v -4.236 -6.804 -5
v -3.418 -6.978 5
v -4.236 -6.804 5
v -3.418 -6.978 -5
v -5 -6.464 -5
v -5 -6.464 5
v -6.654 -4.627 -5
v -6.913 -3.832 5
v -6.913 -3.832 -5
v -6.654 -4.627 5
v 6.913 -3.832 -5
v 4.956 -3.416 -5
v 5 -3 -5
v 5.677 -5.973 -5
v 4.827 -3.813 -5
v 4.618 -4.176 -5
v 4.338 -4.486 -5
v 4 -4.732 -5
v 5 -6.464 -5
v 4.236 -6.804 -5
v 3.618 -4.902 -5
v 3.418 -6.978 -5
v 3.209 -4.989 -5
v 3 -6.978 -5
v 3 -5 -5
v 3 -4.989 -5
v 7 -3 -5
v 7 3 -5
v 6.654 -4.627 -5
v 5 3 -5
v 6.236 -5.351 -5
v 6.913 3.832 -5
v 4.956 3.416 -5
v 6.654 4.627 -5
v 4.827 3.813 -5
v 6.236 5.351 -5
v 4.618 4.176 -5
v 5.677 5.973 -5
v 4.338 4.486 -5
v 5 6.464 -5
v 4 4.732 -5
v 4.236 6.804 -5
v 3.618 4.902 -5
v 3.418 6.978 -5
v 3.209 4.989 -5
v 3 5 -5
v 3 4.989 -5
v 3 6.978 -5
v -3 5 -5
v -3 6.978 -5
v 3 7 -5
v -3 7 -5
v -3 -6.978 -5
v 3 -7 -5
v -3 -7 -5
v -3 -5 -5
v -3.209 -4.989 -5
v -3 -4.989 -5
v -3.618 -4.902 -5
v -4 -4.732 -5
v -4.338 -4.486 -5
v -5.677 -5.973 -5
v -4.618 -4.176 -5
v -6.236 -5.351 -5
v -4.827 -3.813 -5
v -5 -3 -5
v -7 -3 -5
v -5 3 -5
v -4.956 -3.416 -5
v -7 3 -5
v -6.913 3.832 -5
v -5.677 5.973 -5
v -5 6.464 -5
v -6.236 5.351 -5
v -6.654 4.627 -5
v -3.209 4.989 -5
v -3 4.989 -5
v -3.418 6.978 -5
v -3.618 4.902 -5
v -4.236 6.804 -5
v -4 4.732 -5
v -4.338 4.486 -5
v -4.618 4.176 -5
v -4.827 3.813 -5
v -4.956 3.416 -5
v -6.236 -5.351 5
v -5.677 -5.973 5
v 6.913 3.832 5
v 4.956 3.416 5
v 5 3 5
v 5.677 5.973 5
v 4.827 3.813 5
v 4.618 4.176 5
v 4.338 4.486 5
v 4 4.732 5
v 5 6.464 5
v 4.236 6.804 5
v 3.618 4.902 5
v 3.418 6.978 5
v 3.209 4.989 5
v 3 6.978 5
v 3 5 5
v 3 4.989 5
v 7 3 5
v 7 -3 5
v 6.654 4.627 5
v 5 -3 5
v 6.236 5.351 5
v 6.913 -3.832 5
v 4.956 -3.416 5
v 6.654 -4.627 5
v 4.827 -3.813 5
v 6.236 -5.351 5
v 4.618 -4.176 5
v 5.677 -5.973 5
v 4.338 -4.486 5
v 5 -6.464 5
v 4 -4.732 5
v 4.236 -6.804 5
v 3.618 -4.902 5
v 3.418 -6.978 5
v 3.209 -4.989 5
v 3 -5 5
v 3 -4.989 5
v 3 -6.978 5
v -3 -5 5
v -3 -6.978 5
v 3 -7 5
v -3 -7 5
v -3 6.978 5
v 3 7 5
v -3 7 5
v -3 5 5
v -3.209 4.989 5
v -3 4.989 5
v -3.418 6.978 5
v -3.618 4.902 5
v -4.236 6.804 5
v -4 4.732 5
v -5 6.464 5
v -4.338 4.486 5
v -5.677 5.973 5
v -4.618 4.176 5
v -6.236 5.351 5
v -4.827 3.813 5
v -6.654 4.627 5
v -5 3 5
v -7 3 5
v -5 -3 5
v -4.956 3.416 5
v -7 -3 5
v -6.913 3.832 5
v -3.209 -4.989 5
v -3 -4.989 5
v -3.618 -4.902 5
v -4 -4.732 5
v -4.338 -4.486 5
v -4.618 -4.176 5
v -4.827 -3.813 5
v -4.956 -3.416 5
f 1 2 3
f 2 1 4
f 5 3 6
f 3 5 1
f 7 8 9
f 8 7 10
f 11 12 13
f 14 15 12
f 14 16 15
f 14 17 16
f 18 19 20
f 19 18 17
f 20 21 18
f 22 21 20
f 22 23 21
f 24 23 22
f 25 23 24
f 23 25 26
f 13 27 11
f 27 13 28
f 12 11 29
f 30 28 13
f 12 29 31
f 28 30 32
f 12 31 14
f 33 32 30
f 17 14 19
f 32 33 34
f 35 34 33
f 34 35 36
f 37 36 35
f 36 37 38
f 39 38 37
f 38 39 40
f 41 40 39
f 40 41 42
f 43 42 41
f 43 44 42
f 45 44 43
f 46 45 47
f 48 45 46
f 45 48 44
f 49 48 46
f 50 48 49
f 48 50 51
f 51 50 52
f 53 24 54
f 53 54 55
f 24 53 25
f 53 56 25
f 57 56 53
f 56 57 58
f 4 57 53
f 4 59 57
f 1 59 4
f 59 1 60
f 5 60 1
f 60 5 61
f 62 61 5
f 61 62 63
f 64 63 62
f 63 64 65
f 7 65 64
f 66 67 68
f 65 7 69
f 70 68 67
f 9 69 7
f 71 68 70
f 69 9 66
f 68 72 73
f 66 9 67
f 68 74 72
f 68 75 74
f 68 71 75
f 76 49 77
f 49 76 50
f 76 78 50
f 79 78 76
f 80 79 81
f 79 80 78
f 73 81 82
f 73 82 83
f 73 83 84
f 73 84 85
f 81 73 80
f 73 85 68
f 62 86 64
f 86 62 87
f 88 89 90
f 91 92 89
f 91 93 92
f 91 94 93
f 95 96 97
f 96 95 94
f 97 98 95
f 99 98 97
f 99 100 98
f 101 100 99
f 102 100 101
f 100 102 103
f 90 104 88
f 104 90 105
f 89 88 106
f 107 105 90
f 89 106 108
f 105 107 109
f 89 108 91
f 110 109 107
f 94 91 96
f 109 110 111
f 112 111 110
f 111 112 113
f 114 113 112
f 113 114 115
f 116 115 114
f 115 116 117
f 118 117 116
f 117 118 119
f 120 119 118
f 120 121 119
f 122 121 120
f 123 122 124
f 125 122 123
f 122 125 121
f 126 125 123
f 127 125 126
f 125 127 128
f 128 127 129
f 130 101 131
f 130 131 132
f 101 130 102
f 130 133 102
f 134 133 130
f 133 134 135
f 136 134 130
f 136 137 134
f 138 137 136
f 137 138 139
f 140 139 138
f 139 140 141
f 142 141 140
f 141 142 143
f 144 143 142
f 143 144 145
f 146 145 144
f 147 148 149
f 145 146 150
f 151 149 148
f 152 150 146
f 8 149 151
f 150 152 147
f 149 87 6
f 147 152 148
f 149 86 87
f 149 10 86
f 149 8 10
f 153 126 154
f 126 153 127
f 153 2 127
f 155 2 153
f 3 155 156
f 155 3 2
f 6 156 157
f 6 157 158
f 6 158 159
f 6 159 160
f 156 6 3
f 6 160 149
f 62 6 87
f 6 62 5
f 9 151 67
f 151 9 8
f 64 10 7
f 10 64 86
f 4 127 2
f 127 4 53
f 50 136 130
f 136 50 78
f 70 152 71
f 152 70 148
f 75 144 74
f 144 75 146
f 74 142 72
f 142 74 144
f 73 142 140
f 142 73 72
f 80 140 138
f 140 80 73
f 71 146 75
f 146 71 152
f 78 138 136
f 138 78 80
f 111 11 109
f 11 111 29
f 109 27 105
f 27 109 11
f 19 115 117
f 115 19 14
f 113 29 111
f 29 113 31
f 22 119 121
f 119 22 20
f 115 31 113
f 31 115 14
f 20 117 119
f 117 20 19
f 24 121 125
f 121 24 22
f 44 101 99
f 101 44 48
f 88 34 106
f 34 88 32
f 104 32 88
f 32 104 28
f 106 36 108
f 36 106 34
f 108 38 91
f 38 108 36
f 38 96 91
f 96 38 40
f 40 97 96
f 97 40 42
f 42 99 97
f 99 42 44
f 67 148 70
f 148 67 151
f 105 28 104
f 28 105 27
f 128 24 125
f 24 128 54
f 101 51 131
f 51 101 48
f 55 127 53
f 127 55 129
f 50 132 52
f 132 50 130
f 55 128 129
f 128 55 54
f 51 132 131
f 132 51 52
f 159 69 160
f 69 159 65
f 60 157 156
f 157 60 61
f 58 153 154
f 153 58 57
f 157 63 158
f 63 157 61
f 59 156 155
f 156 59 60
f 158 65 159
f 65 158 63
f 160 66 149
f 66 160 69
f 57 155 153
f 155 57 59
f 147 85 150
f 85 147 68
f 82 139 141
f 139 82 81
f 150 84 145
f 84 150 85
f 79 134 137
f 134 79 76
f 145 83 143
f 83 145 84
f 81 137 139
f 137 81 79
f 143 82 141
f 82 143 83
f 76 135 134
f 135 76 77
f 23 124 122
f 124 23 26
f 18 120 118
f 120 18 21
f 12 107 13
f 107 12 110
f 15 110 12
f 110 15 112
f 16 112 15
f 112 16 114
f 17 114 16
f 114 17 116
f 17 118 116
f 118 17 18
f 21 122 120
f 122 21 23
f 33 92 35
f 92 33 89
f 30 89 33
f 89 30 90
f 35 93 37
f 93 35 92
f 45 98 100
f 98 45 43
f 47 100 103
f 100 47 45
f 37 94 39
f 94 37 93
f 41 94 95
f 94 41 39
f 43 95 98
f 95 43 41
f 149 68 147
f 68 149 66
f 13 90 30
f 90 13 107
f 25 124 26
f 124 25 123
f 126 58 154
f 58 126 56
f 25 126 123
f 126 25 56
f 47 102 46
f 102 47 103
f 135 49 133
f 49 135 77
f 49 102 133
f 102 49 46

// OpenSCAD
// file: common.scad
module domeassert(x,msg)
{ 
if (!x) {
echo("this shit failed:", msg);
}
}

module rounded_square(
    center, // x,y,z coordinates of center
    dims, // width (x dimension), length (y dimension), height (z dimension)
    corner_radius, // the radius of the corners
) {
    // the corners
    corners_x=[-(dims[0]*0.5-corner_radius),(dims[0]*0.5-corner_radius)];
    corners_y=[-(dims[1]*0.5-corner_radius),(dims[1]*0.5-corner_radius)];
    translate(center) {
        // Draw the corners
        for (x=corners_x) {
            for(y=corners_y) {
                translate ([x,y,0]) {
                    cylinder(r=corner_radius,h=dims[2],center=true);
                }
            }
        }
        // draw the inner cube
        cube([dims[0]-2*corner_radius,dims[1]-2*corner_radius,dims[2]],center=true);
        // fill in the edges
        for (x=corners_x) {
            translate([x,0,0]) {
                cube([2*corner_radius,dims[1]-2*corner_radius,dims[2]],center=true);
            }
        }
        for (y=corners_y) {
            translate([0,y,0]) {
                cube([dims[0]-2*corner_radius,2*corner_radius,dims[2]],center=true);
            }
        }
        
    }
}

module rounded_shaft(
    center, // x,y,z coordinates of center
    dims, // width (x dimension), length (y dimension), height (z dimension) (INSIDE of shaft)
    corner_radius, // the radius of the corners of the INSIDE of the shaft
    wall_thickness, // the thickness of the walls
) {
difference(){
rounded_square(center,[dims.x+2*wall_thickness,dims.y+2*wall_thickness,dims.z],wall_thickness+corner_radius);
rounded_square(center,[dims.x,dims.y,dims.z+1e-2],corner_radius);
}
}
// main file
use <common.scad>
$fn=30;
wall_thickness=2;
corner_r=2;
///difference(){
///rounded_square([0,0,0],[10+wall_thickness,10+wall_thickness,10],wall_thickness*0.5+corner_r);
///rounded_square([0,0,0],[10,10,10+1e-2],corner_r);
///}
rounded_shaft([0,0,0],[10,10,10],corner_r,wall_thickness);
